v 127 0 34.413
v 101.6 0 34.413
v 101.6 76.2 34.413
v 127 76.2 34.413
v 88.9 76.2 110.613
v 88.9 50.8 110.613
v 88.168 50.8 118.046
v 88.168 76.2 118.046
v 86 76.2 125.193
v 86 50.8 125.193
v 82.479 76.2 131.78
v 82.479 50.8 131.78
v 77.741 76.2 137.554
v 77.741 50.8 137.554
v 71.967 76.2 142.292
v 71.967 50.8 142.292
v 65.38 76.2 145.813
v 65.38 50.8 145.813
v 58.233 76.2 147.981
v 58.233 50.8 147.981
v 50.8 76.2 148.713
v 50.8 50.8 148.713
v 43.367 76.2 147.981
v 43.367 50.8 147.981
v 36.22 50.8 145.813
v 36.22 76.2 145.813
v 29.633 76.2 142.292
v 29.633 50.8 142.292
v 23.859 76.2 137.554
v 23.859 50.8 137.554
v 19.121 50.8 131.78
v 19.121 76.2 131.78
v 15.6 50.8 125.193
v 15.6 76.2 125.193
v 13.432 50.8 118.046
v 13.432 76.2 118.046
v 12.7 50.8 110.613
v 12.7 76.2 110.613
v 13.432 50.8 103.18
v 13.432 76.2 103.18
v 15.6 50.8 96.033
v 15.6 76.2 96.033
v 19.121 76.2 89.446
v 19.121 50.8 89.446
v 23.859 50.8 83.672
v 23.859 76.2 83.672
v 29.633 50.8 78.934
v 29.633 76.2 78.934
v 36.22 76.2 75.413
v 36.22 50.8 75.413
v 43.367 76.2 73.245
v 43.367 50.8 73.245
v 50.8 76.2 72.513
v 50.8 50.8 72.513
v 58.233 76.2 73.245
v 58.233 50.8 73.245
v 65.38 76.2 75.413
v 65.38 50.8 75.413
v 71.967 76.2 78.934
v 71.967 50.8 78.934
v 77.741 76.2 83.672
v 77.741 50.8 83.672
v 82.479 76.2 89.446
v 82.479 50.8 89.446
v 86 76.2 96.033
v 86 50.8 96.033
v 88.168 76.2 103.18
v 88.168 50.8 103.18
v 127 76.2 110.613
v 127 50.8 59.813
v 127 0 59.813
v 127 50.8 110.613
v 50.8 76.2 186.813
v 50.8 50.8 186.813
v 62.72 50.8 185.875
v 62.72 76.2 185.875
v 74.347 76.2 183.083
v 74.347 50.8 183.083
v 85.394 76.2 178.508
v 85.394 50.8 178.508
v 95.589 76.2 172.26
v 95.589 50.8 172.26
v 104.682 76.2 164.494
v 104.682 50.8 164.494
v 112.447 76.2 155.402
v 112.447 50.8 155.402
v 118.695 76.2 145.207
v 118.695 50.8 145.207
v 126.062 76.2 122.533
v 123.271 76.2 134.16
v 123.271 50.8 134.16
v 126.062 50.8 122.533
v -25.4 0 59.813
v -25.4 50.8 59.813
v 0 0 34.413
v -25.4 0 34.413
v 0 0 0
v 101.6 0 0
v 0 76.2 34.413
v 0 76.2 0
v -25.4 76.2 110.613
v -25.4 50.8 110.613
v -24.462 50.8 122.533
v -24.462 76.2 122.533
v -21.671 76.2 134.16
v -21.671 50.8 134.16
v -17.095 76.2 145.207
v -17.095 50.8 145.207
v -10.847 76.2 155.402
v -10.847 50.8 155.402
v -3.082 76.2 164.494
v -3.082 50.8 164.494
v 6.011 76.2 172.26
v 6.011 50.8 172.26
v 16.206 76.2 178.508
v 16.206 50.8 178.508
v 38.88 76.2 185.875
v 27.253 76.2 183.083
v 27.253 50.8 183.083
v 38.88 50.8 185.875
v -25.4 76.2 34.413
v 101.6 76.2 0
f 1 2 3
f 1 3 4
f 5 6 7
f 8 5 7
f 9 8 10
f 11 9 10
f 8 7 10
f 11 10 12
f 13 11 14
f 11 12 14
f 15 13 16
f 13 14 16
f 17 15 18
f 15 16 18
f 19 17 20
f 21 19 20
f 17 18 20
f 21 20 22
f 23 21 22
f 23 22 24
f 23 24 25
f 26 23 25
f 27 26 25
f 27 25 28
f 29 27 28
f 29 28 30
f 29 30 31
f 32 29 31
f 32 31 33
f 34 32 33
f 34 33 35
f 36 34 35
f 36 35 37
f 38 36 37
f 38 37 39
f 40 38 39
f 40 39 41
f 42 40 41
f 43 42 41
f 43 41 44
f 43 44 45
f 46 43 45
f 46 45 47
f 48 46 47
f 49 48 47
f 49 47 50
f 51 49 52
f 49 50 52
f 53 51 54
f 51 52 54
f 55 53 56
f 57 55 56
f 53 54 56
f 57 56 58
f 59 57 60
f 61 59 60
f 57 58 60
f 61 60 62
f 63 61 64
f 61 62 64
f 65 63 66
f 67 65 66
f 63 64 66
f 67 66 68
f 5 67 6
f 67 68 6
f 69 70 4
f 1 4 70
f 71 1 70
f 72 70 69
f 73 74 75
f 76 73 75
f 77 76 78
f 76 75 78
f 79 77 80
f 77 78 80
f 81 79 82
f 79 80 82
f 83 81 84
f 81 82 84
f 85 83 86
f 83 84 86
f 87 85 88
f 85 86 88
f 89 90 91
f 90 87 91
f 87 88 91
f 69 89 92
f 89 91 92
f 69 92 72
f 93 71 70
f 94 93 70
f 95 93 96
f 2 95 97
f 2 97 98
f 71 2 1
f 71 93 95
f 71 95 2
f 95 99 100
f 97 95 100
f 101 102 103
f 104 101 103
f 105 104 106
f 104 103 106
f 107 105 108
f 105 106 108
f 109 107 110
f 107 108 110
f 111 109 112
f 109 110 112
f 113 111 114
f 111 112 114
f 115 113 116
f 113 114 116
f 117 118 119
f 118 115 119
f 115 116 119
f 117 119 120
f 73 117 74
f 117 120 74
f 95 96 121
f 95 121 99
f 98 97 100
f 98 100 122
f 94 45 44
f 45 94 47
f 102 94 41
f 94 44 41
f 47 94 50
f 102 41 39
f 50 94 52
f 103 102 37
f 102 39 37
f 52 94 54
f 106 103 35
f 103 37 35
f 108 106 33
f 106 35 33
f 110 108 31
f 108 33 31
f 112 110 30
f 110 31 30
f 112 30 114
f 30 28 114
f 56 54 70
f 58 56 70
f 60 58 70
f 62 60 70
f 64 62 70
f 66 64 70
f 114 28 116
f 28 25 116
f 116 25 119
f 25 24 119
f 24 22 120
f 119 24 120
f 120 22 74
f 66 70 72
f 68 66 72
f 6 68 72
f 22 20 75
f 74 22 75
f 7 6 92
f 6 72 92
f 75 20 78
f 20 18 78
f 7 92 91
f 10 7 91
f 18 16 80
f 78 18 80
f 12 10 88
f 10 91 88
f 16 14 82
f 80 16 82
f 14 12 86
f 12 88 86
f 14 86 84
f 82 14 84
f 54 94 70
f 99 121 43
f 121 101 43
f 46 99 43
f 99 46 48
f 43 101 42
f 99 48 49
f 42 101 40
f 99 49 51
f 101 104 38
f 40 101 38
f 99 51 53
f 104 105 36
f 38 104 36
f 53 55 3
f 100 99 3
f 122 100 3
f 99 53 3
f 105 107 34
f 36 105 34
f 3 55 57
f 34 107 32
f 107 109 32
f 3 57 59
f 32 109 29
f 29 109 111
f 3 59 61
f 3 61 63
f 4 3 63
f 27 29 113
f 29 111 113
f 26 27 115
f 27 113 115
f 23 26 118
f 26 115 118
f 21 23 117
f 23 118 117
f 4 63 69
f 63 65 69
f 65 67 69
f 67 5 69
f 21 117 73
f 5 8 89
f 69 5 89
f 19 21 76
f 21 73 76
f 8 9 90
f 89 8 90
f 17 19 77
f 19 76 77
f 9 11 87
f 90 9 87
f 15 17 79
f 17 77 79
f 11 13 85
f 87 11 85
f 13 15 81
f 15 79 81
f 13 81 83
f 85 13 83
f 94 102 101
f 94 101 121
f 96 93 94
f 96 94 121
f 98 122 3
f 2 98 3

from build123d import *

# Parameters (mm, degrees)
F1_DEPTH = 76.2
F2_W     = 50.8
F2_H     = 127
F3_DEPTH = 152.401
F4_R     = 38.1
F5_DEPTH = 25.401
F7_DEPTH = 25.401


with BuildPart() as f1:
    # F0 (on Front) → F1 (new body)
    with BuildSketch(Plane.XZ):
        Polygon((0, 34.412902), (0, 0), (101.6, 0), (101.6, 34.412902), (127, 34.412902), (127, 186.812902), (-25.4, 186.812902), (-25.4, 34.412902), align=None)
    extrude(amount=-F1_DEPTH)

    # F2 (on face) → F3 (cut, through all)
    with BuildSketch(Plane.YZ.offset(127)):
        with Locations((25.4, 123.312902)):
            Rectangle(F2_W, F2_H)
    extrude(amount=-F3_DEPTH, mode=Mode.SUBTRACT)

    # F4 (on face) → F5 (cut, through all)
    with BuildSketch(Plane.XZ.offset(-50.8)):
        with Locations((50.8, 110.612902)):
            Circle(F4_R)
    extrude(amount=-F5_DEPTH, mode=Mode.SUBTRACT)

    # F6 (on face) → F7 (cut, through all)
    with BuildSketch(Plane.XZ.offset(-50.8)):
        with BuildLine():
            Line((50.8, 186.812902), (-25.4, 186.812902))
            Line((-25.4, 186.812902), (-25.4, 110.612902))
            ThreePointArc((-25.4, 110.612902), (-3.081537, 164.494439), (50.8, 186.812902))
        make_face()
        with BuildLine():
            Line((127, 186.812902), (50.8, 186.812902))
            ThreePointArc((50.8, 186.812902), (104.681537, 164.494439), (127, 110.612902))
            Line((127, 110.612902), (127, 186.812902))
        make_face()
    extrude(amount=-F7_DEPTH, mode=Mode.SUBTRACT)


solid = f1.part
